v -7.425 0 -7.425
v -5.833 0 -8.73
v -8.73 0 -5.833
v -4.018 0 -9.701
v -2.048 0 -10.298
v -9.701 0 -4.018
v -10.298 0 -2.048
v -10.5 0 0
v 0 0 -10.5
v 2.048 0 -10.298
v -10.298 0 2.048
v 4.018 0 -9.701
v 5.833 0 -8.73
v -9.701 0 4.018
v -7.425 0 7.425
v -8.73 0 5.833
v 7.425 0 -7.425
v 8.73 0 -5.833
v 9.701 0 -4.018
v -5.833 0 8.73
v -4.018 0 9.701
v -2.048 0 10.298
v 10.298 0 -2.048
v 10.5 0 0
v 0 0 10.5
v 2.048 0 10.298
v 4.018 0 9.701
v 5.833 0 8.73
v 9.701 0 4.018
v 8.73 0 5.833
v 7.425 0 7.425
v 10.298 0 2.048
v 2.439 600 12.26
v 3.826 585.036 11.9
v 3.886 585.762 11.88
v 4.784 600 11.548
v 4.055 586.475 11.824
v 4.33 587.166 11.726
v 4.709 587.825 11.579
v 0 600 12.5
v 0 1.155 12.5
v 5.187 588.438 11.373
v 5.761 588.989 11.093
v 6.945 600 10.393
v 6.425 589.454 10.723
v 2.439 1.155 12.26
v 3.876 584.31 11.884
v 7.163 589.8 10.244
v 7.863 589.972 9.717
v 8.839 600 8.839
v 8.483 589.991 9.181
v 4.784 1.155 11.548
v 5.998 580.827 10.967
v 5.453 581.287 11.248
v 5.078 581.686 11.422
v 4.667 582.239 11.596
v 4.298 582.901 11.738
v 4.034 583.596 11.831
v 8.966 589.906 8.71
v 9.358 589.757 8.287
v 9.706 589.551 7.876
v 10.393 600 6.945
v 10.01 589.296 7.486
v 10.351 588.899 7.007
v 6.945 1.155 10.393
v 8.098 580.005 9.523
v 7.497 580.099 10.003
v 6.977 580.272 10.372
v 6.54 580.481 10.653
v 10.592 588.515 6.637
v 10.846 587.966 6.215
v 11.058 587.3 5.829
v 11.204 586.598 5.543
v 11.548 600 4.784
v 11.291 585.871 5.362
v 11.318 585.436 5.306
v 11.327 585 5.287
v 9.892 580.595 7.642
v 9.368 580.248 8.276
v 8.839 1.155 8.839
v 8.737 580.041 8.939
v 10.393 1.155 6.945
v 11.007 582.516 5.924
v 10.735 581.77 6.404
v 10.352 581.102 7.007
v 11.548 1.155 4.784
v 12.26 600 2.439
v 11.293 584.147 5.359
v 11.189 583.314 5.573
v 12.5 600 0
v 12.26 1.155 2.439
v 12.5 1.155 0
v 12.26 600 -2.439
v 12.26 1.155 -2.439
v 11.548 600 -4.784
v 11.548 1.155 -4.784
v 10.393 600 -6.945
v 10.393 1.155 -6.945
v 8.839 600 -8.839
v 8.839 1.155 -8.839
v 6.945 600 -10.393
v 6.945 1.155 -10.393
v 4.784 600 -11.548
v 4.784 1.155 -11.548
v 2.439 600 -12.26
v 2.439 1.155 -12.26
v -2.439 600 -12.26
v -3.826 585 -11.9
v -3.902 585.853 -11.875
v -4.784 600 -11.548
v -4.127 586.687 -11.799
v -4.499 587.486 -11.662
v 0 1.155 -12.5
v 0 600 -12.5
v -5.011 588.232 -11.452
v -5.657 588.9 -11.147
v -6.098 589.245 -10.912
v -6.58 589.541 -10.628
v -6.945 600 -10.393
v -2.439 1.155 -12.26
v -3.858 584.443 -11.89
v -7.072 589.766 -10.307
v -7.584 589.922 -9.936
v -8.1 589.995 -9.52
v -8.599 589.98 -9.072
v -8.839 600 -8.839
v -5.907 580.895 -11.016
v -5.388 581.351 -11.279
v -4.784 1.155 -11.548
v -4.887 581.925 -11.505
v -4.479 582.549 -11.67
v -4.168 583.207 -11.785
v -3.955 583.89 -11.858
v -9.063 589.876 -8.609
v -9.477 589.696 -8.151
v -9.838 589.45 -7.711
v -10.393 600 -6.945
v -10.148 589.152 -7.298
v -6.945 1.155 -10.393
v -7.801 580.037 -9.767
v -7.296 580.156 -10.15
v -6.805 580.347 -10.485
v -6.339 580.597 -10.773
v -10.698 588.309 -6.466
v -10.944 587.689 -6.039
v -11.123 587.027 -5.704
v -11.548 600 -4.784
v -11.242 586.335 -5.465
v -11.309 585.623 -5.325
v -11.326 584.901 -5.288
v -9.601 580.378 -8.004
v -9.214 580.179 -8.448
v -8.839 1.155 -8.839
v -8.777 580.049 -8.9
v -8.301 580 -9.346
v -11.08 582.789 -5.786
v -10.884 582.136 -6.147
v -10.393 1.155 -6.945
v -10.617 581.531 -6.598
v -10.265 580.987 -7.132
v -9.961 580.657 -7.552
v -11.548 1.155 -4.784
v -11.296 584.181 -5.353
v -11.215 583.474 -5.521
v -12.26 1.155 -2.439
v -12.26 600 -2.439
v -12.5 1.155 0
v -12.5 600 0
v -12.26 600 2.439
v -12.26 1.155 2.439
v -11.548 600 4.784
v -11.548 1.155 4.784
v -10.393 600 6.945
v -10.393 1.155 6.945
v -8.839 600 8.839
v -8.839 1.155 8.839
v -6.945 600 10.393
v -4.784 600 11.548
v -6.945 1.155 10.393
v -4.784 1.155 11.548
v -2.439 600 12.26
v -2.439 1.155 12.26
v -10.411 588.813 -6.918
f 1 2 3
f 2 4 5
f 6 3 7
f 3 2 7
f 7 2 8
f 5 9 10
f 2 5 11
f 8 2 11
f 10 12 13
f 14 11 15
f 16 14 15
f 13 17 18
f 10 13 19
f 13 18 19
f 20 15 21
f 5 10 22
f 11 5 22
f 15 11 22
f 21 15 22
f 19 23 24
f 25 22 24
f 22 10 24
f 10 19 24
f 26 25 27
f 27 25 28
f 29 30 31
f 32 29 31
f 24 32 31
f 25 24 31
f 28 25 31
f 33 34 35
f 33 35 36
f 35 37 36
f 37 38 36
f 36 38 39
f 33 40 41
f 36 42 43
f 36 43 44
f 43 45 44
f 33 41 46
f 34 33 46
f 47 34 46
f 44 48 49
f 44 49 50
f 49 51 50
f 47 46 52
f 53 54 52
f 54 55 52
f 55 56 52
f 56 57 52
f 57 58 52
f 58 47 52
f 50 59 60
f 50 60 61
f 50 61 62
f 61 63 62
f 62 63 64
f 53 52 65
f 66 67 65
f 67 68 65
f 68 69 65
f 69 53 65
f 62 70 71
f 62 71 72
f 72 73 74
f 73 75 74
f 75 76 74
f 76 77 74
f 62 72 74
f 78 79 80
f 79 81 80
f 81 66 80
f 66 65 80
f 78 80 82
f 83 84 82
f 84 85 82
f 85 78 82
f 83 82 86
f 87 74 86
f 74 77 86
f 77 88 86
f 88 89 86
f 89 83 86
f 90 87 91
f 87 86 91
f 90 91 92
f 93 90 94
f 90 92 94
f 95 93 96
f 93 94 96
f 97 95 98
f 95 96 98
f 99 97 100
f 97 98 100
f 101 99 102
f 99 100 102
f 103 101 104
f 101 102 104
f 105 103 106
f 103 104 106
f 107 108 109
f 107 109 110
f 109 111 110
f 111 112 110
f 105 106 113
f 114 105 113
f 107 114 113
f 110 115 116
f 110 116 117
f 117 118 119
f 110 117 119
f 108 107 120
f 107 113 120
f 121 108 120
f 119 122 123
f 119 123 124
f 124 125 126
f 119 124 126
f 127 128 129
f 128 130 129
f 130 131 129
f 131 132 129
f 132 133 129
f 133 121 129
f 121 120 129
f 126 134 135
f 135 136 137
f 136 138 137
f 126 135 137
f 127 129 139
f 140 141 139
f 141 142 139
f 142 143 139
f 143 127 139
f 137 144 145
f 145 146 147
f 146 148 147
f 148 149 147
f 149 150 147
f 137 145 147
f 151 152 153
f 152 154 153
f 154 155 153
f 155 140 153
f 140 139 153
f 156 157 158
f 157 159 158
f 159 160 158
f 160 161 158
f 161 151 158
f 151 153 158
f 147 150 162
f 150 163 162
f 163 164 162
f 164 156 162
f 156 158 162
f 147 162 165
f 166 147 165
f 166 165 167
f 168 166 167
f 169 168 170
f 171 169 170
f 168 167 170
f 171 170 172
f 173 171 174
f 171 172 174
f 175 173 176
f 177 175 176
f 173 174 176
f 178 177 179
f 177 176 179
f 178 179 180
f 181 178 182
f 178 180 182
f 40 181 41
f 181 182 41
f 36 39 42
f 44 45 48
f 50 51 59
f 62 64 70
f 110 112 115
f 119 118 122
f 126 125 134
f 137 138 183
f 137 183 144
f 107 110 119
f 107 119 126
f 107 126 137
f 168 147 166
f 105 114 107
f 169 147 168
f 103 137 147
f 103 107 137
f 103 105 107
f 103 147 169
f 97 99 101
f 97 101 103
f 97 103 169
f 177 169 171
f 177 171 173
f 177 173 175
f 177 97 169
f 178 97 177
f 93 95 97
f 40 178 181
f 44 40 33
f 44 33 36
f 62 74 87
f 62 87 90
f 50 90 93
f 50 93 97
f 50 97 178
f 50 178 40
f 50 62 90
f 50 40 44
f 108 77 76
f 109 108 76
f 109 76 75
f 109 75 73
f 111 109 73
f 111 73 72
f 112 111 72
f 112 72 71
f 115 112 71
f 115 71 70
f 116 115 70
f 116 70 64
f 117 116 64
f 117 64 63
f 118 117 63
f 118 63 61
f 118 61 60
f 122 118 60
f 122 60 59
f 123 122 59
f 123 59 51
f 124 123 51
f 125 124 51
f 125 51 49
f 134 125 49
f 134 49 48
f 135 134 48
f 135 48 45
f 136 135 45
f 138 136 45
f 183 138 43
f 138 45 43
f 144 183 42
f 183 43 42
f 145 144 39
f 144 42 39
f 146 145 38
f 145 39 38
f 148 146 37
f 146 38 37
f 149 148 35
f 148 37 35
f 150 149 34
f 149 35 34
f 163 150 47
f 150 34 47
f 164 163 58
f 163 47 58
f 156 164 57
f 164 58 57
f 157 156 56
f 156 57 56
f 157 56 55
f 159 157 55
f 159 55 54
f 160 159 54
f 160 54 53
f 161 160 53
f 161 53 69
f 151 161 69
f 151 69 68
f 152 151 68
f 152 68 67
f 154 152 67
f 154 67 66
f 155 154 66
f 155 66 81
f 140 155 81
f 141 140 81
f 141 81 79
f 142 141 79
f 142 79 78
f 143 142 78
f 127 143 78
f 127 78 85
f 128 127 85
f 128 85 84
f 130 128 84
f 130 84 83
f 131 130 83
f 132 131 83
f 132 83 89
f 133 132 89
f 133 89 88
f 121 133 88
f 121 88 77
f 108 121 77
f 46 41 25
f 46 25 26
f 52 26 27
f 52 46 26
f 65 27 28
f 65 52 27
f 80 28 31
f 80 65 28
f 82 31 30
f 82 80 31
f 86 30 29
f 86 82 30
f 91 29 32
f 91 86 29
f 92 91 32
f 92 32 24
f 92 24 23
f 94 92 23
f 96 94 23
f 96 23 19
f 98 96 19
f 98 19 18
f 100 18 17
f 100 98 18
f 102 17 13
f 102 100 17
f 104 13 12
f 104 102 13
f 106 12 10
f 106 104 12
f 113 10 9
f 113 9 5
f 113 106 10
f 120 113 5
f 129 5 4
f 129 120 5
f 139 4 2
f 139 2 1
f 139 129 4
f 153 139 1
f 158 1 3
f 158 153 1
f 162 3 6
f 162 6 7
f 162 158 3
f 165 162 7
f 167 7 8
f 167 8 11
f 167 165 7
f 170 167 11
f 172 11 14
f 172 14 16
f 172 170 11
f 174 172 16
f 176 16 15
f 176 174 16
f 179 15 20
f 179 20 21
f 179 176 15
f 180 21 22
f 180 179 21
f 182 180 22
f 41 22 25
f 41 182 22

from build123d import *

# Parameters (mm, degrees)
SKETCH1_R           = 12.5
BOSS_EXTRUDE1_DEPTH = 600
SKETCH5_R           = 5
CUT_EXTRUDE2_DEPTH  = 685
CHAMFER1_SIZE       = 2
CHAMFER1_SIZE2      = 1.154700538


with BuildPart() as part:
    # Sketch1 → Boss-Extrude1 (new body)
    with BuildSketch(Plane(origin=(0, 0, 0), x_dir=(1, 0, 0), z_dir=(0, 1, 0))):
        with Locations(Location((0, 0, 0), (0, 0, 270))):
            Circle(SKETCH1_R)
    extrude(amount=BOSS_EXTRUDE1_DEPTH)

    # Sketch5 → Cut-Extrude2 (cut)
    with BuildSketch(Plane(origin=(8.266546367, 600, 9.376257844), x_dir=(0.7501006275419531, 0, -0.6613237093596208), z_dir=(0.6613237093596208, 0, 0.7501006275419531))):
        with Locations((0, -15)):
            Circle(SKETCH5_R)
    extrude(amount=-CUT_EXTRUDE2_DEPTH, mode=Mode.SUBTRACT)

    # Chamfer1
    chamfer1_edges = [part.edges().sort_by_distance(p)[0] for p in [
        (0, 0, -12.5),
    ]]
    chamfer1_side = [part.faces().sort_by_distance(p)[0] for p in [
        (0, 0, 0),
    ]]
    chamfer(chamfer1_edges, length=CHAMFER1_SIZE, length2=CHAMFER1_SIZE2, reference=chamfer1_side[0])


solid = part.part
